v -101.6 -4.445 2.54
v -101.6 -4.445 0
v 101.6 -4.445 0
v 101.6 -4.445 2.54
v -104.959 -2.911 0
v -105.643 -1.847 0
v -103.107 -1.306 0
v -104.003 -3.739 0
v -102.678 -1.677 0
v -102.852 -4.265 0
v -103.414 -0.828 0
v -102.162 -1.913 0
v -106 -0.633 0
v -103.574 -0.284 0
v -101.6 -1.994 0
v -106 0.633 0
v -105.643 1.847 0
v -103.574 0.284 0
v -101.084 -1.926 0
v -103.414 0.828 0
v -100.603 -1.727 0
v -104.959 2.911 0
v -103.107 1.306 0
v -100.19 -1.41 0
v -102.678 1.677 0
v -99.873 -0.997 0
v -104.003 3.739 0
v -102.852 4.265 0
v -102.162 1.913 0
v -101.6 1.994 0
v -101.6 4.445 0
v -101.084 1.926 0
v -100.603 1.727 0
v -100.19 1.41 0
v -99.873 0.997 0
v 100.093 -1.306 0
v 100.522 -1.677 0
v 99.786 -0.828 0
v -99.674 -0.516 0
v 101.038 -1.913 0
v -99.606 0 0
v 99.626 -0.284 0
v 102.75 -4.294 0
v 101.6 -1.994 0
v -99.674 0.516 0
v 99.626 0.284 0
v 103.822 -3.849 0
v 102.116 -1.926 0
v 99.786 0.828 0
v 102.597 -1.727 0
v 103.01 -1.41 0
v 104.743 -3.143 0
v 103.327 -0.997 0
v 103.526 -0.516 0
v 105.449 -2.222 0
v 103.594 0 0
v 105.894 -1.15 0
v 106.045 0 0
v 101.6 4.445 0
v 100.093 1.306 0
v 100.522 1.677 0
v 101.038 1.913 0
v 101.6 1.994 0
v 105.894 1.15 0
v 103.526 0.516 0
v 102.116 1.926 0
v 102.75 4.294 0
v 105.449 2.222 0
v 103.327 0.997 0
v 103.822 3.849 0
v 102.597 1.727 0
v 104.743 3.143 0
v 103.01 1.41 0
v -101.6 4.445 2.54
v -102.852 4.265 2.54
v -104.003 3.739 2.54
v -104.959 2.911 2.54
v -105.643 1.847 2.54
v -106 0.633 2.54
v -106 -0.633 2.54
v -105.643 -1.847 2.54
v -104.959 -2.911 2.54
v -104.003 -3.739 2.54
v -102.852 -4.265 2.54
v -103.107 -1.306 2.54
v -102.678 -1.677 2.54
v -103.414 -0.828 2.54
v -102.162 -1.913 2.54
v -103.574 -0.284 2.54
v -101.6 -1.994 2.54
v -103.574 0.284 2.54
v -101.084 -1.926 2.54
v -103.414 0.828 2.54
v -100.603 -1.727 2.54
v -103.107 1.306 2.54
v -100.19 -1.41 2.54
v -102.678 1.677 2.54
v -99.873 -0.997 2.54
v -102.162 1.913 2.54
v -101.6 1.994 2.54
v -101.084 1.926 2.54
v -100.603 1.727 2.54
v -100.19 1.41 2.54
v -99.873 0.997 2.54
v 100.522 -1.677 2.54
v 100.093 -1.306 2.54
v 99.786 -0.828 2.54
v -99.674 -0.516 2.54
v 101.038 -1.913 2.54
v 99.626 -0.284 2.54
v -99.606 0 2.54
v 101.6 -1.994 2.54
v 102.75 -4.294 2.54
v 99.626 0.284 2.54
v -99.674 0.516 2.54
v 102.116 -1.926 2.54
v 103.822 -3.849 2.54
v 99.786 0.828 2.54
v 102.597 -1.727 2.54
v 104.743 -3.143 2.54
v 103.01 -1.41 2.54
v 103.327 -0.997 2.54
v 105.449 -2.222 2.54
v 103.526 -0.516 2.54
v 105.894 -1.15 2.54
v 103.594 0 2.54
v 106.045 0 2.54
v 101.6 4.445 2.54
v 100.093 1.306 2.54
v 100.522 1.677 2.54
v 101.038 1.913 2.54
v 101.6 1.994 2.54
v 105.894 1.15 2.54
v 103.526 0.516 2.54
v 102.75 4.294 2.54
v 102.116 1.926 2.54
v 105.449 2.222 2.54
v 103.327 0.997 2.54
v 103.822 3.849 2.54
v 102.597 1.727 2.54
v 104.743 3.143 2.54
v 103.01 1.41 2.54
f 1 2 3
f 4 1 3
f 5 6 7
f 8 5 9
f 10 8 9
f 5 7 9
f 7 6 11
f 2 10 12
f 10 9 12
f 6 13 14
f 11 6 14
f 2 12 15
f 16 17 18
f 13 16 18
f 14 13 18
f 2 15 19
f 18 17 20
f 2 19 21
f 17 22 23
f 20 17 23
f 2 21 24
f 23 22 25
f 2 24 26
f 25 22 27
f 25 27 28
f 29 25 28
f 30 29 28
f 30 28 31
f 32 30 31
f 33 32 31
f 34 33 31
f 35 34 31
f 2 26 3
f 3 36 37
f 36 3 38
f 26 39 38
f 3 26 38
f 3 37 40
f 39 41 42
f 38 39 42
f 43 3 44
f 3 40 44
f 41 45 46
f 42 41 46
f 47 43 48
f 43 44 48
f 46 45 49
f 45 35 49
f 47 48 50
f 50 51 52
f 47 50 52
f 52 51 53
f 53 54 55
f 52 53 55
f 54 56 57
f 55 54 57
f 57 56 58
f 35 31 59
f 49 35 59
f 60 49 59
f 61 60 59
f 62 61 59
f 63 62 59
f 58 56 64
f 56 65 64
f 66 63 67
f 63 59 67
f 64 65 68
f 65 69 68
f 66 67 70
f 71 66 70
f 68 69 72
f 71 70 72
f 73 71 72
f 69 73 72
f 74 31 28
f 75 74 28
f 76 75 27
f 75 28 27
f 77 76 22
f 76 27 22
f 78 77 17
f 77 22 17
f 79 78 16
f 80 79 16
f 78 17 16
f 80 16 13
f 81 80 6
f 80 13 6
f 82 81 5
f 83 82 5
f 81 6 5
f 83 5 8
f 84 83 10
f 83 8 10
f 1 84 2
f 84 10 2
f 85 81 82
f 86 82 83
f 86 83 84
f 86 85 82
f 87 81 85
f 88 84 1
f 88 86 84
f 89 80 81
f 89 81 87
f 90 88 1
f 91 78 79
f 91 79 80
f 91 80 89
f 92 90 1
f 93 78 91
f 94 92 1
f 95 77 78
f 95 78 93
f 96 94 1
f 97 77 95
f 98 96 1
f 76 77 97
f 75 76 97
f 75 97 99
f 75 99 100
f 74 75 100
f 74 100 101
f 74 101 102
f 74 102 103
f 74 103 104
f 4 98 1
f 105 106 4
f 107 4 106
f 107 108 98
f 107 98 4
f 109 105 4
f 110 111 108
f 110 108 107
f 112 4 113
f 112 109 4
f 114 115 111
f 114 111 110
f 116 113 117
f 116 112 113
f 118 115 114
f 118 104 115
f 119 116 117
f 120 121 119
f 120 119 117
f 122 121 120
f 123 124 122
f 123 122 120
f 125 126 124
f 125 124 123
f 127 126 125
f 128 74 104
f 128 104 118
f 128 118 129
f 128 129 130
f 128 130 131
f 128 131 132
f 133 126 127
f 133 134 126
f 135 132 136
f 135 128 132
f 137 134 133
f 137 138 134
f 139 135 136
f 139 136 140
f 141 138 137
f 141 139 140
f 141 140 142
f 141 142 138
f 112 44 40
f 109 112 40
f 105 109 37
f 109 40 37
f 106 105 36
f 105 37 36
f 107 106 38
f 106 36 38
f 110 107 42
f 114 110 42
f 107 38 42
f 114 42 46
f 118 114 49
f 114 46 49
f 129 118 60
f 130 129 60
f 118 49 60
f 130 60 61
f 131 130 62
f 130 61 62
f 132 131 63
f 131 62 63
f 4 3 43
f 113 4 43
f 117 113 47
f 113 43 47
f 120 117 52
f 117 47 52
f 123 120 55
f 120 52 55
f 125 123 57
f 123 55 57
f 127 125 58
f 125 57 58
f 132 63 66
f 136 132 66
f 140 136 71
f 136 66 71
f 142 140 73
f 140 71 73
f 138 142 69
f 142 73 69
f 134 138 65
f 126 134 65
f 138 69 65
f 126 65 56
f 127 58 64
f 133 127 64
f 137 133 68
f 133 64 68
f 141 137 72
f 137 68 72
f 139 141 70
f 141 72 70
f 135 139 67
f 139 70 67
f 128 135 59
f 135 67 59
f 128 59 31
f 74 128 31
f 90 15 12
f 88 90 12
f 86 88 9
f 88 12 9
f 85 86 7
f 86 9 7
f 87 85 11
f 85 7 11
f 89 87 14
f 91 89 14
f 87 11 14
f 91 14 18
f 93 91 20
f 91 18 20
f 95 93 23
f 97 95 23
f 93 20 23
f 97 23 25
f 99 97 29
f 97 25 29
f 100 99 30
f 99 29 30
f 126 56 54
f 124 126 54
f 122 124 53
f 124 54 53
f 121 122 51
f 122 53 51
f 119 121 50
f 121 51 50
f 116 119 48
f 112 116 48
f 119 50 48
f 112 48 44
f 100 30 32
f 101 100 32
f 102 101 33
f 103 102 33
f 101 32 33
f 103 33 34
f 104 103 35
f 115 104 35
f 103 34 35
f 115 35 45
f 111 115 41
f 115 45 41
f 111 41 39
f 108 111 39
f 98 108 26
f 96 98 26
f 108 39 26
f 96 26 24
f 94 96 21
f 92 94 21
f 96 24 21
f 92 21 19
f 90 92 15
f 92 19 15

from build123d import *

# Parameters (mm, degrees)
BOSS_EXTRUDE1_DEPTH = 2.54


with BuildPart() as part:
    # Sketch1 → Boss-Extrude1 (new body)
    with BuildSketch(Plane.XY):
        with BuildLine():
            Line((101.6, 4.445), (-101.6, 4.445))
            ThreePointArc((-101.6, 4.445), (-98.456910358, 3.143089642), (-97.155, 0))
            ThreePointArc((-97.155, 0), (-98.456910358, -3.143089642), (-101.6, -4.445))
            Line((-101.6, -4.445), (101.6, -4.445))
            ThreePointArc((101.6, -4.445), (97.155, 0), (101.6, 4.445))
        make_face()
        with BuildLine():
            ThreePointArc((-97.155, 0), (-98.456910358, 3.143089642), (-101.6, 4.445))
            Line((-101.6, 4.445), (-101.6, 1.9939))
            ThreePointArc((-101.6, 1.9939), (-100.190099789, 1.409900211), (-99.6061, 0))
            ThreePointArc((-99.6061, 0), (-100.190099789, -1.409900211), (-101.6, -1.9939))
            Line((-101.6, -1.9939), (-101.6, -4.445))
            ThreePointArc((-101.6, -4.445), (-98.456910358, -3.143089642), (-97.155, 0))
        make_face()
        with BuildLine():
            Line((-101.6, 1.9939), (-101.6, 4.445))
            ThreePointArc((-101.6, 4.445), (-106.045, 0), (-101.6, -4.445))
            Line((-101.6, -4.445), (-101.6, -1.9939))
            ThreePointArc((-101.6, -1.9939), (-103.5939, 0), (-101.6, 1.9939))
        make_face()
        with BuildLine():
            ThreePointArc((106.045, 0), (104.743089642, 3.143089642), (101.6, 4.445))
            Line((101.6, 4.445), (101.6, 1.9939))
            ThreePointArc((101.6, 1.9939), (103.009900211, 1.409900211), (103.5939, 0))
            ThreePointArc((103.5939, 0), (103.009900211, -1.409900211), (101.6, -1.9939))
            Line((101.6, -1.9939), (101.6, -4.445))
            ThreePointArc((101.6, -4.445), (104.743089642, -3.143089642), (106.045, 0))
        make_face()
        with BuildLine():
            Line((101.6, 1.9939), (101.6, 4.445))
            ThreePointArc((101.6, 4.445), (97.155, 0), (101.6, -4.445))
            Line((101.6, -4.445), (101.6, -1.9939))
            ThreePointArc((101.6, -1.9939), (99.6061, 0), (101.6, 1.9939))
        make_face()
    extrude(amount=BOSS_EXTRUDE1_DEPTH)


solid = part.part
